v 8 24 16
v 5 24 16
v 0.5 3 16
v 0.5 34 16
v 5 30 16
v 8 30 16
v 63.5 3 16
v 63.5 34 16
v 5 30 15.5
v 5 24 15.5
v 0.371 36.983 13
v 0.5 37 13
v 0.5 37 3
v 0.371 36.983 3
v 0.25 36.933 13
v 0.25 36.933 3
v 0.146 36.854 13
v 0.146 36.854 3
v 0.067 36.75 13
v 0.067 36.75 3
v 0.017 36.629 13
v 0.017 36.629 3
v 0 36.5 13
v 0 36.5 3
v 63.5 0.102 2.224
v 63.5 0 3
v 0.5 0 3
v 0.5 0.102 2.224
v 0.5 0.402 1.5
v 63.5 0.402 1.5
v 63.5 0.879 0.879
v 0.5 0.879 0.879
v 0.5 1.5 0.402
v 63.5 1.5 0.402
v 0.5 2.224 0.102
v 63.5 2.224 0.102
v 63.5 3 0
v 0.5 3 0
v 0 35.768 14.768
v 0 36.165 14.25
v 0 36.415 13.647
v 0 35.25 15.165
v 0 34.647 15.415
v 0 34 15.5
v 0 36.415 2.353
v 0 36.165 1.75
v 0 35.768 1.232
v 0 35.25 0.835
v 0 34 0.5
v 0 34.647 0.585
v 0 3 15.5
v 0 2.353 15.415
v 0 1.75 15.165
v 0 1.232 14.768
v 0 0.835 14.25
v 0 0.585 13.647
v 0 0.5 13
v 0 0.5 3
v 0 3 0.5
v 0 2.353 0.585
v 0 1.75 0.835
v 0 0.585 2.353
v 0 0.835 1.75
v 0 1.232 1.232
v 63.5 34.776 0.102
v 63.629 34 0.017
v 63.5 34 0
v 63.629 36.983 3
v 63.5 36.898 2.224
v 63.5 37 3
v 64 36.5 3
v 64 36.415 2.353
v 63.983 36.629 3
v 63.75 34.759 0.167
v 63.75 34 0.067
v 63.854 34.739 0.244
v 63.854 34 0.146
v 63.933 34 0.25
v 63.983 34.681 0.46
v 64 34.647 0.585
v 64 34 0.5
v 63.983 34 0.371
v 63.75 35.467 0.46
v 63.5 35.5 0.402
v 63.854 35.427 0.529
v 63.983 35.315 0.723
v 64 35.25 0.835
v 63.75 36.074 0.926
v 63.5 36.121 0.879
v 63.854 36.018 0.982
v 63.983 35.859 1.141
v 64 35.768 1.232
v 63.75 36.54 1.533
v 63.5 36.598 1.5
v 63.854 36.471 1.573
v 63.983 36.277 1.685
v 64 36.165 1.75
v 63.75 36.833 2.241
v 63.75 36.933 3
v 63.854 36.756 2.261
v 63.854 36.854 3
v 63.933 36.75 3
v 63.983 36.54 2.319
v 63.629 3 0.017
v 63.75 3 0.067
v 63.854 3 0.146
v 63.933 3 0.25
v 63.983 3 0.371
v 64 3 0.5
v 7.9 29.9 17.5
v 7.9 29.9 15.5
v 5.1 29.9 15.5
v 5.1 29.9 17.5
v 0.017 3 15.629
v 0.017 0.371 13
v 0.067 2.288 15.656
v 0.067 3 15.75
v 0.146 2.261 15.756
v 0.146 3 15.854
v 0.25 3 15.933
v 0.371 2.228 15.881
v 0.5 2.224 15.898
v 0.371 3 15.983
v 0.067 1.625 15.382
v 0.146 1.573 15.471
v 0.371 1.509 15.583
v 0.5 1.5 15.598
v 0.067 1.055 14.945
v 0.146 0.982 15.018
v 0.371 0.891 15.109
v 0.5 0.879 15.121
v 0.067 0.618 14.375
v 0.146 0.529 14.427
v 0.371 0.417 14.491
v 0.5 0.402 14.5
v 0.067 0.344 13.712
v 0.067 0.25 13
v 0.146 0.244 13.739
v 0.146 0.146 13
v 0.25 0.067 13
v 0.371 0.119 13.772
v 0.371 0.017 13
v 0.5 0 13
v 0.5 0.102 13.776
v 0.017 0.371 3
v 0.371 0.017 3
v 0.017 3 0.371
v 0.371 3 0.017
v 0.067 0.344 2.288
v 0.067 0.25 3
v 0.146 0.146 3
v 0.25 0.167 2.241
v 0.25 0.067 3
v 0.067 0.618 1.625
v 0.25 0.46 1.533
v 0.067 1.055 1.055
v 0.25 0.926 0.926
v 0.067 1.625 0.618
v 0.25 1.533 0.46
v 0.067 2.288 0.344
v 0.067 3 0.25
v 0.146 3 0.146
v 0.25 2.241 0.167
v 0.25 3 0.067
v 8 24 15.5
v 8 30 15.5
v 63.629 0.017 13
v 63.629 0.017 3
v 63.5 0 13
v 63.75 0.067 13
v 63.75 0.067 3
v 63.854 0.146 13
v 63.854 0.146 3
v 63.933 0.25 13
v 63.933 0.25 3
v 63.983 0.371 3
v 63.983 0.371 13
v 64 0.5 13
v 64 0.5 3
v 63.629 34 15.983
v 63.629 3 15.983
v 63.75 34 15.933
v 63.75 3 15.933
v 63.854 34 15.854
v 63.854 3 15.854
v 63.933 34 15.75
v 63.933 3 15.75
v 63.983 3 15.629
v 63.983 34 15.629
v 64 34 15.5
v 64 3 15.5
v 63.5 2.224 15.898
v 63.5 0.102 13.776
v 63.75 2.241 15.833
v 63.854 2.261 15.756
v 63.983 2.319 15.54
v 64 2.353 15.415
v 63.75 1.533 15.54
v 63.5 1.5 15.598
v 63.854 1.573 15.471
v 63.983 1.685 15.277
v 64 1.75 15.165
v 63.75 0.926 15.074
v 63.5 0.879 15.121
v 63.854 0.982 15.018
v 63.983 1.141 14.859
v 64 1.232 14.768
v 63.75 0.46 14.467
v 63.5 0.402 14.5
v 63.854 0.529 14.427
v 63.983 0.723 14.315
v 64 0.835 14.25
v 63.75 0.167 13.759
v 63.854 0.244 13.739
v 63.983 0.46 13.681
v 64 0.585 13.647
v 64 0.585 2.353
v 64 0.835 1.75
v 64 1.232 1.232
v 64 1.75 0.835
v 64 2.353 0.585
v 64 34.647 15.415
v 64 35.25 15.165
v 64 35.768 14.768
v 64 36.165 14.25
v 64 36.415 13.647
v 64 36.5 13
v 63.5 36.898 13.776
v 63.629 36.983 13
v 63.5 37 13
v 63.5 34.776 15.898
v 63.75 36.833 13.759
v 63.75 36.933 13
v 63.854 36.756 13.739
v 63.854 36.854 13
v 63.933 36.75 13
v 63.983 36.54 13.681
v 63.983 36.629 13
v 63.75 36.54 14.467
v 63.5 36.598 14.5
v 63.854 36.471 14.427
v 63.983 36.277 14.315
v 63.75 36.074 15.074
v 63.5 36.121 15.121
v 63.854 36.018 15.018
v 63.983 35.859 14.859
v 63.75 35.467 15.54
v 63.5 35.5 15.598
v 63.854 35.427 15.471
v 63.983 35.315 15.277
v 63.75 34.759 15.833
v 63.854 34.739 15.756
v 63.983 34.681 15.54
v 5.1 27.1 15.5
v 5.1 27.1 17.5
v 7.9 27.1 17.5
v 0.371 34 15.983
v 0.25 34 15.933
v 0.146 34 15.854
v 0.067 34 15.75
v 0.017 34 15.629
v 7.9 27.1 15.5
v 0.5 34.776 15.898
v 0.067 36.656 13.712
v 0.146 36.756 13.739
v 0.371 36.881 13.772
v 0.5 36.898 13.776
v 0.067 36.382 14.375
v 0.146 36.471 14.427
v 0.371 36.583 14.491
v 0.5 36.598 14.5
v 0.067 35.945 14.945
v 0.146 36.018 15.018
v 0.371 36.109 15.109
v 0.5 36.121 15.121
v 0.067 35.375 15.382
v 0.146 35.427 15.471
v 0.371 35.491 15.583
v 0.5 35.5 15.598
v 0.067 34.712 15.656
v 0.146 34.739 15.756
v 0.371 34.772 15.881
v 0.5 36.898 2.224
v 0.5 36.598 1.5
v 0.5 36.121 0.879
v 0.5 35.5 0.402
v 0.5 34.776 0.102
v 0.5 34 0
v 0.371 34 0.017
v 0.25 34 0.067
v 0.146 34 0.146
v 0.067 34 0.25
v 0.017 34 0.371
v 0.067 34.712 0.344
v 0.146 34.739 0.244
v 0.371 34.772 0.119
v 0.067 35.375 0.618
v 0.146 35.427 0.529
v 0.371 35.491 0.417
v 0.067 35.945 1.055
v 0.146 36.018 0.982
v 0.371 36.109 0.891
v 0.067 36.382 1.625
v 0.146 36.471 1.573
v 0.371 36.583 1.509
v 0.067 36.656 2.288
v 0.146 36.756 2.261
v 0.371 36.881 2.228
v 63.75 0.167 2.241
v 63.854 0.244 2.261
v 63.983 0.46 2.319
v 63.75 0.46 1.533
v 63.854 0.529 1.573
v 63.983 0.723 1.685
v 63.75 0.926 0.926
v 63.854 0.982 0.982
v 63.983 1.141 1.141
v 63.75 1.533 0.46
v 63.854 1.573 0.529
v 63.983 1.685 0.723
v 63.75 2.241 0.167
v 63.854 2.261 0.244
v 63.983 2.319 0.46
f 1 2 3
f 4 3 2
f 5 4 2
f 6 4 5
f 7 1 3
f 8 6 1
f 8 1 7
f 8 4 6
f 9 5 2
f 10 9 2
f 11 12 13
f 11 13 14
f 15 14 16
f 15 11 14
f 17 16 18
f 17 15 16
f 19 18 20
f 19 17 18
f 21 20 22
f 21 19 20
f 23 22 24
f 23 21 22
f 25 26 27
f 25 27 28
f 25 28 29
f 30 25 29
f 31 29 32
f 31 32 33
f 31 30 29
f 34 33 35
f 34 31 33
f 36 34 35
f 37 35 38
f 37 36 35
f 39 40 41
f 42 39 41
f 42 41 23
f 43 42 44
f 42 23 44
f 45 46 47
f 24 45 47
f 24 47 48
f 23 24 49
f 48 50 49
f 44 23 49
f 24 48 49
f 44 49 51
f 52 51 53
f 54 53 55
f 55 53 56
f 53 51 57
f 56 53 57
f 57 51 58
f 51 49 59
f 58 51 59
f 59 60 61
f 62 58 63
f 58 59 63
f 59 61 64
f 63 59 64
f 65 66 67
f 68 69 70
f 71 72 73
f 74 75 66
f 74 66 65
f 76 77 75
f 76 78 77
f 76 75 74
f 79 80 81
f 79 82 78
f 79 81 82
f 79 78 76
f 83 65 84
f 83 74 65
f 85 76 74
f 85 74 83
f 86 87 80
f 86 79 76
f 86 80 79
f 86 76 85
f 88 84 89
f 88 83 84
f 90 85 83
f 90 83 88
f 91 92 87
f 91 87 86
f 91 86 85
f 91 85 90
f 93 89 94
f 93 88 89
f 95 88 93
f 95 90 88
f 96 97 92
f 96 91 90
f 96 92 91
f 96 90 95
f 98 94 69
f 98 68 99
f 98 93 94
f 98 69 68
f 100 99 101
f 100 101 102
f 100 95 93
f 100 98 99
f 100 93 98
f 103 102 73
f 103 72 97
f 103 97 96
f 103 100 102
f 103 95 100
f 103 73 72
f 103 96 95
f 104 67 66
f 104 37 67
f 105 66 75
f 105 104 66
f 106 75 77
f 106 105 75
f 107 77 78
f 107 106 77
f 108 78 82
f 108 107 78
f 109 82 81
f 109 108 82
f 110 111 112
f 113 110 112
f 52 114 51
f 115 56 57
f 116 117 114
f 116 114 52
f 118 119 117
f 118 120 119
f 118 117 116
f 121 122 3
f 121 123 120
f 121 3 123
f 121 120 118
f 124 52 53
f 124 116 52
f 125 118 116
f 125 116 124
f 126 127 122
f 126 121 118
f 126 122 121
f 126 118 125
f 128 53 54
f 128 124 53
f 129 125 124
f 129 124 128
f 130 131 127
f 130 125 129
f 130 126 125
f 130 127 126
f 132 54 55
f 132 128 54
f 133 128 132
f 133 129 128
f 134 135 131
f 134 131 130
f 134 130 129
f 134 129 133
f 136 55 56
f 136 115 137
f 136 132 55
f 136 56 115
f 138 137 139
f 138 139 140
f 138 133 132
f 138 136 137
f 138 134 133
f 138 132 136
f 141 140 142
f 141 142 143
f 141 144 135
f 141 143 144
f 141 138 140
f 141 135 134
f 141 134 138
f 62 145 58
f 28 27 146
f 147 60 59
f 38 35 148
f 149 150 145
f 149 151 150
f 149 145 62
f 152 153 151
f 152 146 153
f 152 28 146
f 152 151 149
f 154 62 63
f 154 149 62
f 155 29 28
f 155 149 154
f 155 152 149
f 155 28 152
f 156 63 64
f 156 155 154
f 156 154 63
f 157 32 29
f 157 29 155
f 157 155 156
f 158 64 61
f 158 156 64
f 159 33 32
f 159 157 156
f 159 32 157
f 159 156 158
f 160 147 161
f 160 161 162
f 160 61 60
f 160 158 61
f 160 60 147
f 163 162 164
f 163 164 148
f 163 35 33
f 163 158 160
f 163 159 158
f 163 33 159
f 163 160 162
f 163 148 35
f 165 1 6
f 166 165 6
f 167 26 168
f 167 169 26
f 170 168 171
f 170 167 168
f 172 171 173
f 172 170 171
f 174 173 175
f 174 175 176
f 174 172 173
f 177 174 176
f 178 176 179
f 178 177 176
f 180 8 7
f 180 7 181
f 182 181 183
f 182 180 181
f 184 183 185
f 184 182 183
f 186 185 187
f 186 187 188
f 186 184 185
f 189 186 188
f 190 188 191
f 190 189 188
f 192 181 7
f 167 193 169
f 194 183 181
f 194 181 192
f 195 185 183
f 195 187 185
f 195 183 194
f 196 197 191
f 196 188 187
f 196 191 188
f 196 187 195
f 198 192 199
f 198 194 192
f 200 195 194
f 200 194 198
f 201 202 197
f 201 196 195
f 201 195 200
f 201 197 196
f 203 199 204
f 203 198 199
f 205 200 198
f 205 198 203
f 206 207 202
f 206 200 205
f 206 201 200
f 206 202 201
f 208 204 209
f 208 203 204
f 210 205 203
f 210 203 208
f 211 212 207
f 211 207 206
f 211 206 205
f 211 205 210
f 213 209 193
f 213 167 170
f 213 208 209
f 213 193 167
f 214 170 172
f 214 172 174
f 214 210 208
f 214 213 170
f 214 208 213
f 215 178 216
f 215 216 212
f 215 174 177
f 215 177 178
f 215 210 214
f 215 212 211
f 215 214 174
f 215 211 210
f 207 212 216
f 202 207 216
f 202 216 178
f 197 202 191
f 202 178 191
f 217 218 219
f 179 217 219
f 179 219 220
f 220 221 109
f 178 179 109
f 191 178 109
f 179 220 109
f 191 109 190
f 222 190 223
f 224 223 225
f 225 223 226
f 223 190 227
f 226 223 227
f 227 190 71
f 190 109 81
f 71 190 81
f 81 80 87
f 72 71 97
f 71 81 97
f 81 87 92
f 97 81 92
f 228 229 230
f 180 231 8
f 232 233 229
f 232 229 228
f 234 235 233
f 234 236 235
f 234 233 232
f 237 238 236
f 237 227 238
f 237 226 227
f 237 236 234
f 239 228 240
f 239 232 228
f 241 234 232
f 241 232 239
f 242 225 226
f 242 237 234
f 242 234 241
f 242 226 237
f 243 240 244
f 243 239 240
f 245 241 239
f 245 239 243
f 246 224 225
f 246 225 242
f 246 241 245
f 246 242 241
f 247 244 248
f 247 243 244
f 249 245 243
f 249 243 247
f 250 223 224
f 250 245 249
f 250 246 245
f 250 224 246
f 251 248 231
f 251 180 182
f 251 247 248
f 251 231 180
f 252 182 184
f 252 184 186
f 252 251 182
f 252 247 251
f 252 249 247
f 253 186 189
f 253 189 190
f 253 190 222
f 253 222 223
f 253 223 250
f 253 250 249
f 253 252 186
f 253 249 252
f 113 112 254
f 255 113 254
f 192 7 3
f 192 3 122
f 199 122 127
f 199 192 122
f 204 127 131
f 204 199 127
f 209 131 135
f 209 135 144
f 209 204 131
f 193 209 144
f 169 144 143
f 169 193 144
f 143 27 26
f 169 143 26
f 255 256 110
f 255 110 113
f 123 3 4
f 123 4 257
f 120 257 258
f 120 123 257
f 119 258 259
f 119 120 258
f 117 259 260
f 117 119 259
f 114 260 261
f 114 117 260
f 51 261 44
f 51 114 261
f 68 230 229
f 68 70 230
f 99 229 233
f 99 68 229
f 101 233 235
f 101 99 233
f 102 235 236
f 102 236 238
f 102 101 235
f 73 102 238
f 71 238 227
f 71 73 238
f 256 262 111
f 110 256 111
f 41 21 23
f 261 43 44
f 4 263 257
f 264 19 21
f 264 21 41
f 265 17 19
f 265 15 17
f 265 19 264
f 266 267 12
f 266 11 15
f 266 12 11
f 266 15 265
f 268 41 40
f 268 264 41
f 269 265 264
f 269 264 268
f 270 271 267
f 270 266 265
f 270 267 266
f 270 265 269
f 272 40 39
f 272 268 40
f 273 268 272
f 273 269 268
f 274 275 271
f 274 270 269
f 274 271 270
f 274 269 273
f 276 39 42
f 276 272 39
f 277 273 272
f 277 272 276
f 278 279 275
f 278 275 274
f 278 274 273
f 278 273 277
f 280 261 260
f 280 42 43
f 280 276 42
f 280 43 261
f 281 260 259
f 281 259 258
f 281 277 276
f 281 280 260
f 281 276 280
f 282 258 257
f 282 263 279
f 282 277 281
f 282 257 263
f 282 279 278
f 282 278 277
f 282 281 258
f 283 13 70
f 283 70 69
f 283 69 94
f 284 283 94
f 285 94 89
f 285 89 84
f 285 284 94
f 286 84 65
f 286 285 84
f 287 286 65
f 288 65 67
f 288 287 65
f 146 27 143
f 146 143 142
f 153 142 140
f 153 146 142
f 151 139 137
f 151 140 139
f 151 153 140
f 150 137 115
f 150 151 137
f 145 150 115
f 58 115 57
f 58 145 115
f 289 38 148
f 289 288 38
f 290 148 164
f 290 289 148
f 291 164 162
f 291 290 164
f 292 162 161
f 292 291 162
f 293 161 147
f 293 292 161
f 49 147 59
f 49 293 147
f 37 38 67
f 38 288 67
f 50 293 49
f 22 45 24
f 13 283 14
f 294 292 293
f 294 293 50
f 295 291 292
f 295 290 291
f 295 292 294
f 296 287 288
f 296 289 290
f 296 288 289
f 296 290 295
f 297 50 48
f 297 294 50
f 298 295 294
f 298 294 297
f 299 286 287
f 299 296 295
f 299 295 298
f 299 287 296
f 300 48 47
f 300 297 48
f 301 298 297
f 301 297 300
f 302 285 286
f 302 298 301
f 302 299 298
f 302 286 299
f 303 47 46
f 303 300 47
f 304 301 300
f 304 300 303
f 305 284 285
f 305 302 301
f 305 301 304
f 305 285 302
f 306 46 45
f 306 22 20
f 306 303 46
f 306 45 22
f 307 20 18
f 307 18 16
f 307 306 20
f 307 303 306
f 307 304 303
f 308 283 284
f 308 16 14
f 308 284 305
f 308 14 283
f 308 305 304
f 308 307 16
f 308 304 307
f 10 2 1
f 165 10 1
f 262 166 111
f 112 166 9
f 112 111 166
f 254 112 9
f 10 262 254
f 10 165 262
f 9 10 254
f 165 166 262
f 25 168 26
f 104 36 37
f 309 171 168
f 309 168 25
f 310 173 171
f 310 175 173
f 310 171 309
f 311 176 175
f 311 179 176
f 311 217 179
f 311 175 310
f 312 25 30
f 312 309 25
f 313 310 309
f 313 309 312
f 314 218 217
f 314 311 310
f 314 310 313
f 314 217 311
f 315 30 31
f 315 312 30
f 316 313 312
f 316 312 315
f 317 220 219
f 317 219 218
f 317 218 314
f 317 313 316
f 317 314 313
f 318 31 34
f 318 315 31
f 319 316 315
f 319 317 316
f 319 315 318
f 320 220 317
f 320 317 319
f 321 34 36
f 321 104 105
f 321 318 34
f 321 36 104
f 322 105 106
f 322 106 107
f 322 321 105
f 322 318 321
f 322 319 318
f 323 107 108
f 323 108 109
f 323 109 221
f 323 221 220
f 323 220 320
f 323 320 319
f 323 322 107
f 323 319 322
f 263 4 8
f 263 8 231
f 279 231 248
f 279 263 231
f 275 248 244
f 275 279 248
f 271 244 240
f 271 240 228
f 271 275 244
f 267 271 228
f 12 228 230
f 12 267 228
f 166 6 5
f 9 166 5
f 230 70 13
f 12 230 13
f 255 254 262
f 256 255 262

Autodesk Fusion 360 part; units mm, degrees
sketch "Sketch1" plane through (0, 0, 0) normal (0, 0, 1) x (1, 0, 0)
  line L0 (0, 0) -> (64, 0)
  line L1 (64, 0) -> (64, 37)
  line L2 (64, 37) -> (0, 37)
  line L3 (0, 37) -> (0, 0)
  dimension "d1" = 64
  dimension "d2" = 37
extrude "Extrude1" add sketch "Sketch1" along normal blind 16
fillet "Fillet1" radius 3 4 edges at (32, 0, 16) (32, 37, 16) (32, 0, 0) (32, 37, 0)
fillet "Fillet2" radius 0.5 16 edges at (64, 36.1213, 0.8787) (64, 37, 8) (64, 36.1213, 15.1213) (64, 18.5, 16) (64, 0.8787, 15.1213) (64, 0, 8) (64, 0.8787, 0.8787) (64, 18.5, 0) (0, 0.8787, 0.8787) (0, 0, 8) (0, 0.8787, 15.1213) (0, 18.5, 16) (0, 36.1213, 15.1213) (0, 37, 8) (0, 36.1213, 0.8787) (0, 18.5, 0)
sketch "Sketch2" plane through (0, 0, 16) normal (0, 0, 1) x (-1, 0, 0)
  line L0 (-0.5, -34) -> (-0.5, -3)
  line L1 (-0.5, -3) -> (-63.5, -3)
  line L2 (-63.5, -3) -> (-63.5, -34)
  line L3 (-63.5, -34) -> (-0.5, -34)
  line L4 (-5, -24) -> (-8, -24)
  line L5 (-8, -24) -> (-8, -30)
  line L6 (-8, -30) -> (-5, -30)
  line L7 (-5, -30) -> (-5, -24)
  dimension "d7" = 3
  dimension "d8" = 6
extrude "Extrude2" cut sketch "Sketch2" against normal blind 0.5 contours L4 L5 L6 L7
sketch "Sketch3" plane through (0, 0, 15.5) normal (0, 0, 1) x (-1, 0, 0)
  line L0 (-5, -30) -> (-5, -24)
  line L1 (-5, -24) -> (-8, -24)
  line L2 (-8, -24) -> (-8, -30)
  line L3 (-8, -30) -> (-5, -30)
  line L4 (-5, -27) -> (-8, -27)
  line L5 (-5.1, -27.1) -> (-7.9, -27.1)
  line L6 (-7.9, -27.1) -> (-7.9, -29.9)
  line L7 (-7.9, -29.9) -> (-5.1, -29.9)
  line L8 (-5.1, -29.9) -> (-5.1, -27.1)
extrude "Extrude3" add sketch "Sketch3" along normal blind 2 contours L5 L6 L7 L8
